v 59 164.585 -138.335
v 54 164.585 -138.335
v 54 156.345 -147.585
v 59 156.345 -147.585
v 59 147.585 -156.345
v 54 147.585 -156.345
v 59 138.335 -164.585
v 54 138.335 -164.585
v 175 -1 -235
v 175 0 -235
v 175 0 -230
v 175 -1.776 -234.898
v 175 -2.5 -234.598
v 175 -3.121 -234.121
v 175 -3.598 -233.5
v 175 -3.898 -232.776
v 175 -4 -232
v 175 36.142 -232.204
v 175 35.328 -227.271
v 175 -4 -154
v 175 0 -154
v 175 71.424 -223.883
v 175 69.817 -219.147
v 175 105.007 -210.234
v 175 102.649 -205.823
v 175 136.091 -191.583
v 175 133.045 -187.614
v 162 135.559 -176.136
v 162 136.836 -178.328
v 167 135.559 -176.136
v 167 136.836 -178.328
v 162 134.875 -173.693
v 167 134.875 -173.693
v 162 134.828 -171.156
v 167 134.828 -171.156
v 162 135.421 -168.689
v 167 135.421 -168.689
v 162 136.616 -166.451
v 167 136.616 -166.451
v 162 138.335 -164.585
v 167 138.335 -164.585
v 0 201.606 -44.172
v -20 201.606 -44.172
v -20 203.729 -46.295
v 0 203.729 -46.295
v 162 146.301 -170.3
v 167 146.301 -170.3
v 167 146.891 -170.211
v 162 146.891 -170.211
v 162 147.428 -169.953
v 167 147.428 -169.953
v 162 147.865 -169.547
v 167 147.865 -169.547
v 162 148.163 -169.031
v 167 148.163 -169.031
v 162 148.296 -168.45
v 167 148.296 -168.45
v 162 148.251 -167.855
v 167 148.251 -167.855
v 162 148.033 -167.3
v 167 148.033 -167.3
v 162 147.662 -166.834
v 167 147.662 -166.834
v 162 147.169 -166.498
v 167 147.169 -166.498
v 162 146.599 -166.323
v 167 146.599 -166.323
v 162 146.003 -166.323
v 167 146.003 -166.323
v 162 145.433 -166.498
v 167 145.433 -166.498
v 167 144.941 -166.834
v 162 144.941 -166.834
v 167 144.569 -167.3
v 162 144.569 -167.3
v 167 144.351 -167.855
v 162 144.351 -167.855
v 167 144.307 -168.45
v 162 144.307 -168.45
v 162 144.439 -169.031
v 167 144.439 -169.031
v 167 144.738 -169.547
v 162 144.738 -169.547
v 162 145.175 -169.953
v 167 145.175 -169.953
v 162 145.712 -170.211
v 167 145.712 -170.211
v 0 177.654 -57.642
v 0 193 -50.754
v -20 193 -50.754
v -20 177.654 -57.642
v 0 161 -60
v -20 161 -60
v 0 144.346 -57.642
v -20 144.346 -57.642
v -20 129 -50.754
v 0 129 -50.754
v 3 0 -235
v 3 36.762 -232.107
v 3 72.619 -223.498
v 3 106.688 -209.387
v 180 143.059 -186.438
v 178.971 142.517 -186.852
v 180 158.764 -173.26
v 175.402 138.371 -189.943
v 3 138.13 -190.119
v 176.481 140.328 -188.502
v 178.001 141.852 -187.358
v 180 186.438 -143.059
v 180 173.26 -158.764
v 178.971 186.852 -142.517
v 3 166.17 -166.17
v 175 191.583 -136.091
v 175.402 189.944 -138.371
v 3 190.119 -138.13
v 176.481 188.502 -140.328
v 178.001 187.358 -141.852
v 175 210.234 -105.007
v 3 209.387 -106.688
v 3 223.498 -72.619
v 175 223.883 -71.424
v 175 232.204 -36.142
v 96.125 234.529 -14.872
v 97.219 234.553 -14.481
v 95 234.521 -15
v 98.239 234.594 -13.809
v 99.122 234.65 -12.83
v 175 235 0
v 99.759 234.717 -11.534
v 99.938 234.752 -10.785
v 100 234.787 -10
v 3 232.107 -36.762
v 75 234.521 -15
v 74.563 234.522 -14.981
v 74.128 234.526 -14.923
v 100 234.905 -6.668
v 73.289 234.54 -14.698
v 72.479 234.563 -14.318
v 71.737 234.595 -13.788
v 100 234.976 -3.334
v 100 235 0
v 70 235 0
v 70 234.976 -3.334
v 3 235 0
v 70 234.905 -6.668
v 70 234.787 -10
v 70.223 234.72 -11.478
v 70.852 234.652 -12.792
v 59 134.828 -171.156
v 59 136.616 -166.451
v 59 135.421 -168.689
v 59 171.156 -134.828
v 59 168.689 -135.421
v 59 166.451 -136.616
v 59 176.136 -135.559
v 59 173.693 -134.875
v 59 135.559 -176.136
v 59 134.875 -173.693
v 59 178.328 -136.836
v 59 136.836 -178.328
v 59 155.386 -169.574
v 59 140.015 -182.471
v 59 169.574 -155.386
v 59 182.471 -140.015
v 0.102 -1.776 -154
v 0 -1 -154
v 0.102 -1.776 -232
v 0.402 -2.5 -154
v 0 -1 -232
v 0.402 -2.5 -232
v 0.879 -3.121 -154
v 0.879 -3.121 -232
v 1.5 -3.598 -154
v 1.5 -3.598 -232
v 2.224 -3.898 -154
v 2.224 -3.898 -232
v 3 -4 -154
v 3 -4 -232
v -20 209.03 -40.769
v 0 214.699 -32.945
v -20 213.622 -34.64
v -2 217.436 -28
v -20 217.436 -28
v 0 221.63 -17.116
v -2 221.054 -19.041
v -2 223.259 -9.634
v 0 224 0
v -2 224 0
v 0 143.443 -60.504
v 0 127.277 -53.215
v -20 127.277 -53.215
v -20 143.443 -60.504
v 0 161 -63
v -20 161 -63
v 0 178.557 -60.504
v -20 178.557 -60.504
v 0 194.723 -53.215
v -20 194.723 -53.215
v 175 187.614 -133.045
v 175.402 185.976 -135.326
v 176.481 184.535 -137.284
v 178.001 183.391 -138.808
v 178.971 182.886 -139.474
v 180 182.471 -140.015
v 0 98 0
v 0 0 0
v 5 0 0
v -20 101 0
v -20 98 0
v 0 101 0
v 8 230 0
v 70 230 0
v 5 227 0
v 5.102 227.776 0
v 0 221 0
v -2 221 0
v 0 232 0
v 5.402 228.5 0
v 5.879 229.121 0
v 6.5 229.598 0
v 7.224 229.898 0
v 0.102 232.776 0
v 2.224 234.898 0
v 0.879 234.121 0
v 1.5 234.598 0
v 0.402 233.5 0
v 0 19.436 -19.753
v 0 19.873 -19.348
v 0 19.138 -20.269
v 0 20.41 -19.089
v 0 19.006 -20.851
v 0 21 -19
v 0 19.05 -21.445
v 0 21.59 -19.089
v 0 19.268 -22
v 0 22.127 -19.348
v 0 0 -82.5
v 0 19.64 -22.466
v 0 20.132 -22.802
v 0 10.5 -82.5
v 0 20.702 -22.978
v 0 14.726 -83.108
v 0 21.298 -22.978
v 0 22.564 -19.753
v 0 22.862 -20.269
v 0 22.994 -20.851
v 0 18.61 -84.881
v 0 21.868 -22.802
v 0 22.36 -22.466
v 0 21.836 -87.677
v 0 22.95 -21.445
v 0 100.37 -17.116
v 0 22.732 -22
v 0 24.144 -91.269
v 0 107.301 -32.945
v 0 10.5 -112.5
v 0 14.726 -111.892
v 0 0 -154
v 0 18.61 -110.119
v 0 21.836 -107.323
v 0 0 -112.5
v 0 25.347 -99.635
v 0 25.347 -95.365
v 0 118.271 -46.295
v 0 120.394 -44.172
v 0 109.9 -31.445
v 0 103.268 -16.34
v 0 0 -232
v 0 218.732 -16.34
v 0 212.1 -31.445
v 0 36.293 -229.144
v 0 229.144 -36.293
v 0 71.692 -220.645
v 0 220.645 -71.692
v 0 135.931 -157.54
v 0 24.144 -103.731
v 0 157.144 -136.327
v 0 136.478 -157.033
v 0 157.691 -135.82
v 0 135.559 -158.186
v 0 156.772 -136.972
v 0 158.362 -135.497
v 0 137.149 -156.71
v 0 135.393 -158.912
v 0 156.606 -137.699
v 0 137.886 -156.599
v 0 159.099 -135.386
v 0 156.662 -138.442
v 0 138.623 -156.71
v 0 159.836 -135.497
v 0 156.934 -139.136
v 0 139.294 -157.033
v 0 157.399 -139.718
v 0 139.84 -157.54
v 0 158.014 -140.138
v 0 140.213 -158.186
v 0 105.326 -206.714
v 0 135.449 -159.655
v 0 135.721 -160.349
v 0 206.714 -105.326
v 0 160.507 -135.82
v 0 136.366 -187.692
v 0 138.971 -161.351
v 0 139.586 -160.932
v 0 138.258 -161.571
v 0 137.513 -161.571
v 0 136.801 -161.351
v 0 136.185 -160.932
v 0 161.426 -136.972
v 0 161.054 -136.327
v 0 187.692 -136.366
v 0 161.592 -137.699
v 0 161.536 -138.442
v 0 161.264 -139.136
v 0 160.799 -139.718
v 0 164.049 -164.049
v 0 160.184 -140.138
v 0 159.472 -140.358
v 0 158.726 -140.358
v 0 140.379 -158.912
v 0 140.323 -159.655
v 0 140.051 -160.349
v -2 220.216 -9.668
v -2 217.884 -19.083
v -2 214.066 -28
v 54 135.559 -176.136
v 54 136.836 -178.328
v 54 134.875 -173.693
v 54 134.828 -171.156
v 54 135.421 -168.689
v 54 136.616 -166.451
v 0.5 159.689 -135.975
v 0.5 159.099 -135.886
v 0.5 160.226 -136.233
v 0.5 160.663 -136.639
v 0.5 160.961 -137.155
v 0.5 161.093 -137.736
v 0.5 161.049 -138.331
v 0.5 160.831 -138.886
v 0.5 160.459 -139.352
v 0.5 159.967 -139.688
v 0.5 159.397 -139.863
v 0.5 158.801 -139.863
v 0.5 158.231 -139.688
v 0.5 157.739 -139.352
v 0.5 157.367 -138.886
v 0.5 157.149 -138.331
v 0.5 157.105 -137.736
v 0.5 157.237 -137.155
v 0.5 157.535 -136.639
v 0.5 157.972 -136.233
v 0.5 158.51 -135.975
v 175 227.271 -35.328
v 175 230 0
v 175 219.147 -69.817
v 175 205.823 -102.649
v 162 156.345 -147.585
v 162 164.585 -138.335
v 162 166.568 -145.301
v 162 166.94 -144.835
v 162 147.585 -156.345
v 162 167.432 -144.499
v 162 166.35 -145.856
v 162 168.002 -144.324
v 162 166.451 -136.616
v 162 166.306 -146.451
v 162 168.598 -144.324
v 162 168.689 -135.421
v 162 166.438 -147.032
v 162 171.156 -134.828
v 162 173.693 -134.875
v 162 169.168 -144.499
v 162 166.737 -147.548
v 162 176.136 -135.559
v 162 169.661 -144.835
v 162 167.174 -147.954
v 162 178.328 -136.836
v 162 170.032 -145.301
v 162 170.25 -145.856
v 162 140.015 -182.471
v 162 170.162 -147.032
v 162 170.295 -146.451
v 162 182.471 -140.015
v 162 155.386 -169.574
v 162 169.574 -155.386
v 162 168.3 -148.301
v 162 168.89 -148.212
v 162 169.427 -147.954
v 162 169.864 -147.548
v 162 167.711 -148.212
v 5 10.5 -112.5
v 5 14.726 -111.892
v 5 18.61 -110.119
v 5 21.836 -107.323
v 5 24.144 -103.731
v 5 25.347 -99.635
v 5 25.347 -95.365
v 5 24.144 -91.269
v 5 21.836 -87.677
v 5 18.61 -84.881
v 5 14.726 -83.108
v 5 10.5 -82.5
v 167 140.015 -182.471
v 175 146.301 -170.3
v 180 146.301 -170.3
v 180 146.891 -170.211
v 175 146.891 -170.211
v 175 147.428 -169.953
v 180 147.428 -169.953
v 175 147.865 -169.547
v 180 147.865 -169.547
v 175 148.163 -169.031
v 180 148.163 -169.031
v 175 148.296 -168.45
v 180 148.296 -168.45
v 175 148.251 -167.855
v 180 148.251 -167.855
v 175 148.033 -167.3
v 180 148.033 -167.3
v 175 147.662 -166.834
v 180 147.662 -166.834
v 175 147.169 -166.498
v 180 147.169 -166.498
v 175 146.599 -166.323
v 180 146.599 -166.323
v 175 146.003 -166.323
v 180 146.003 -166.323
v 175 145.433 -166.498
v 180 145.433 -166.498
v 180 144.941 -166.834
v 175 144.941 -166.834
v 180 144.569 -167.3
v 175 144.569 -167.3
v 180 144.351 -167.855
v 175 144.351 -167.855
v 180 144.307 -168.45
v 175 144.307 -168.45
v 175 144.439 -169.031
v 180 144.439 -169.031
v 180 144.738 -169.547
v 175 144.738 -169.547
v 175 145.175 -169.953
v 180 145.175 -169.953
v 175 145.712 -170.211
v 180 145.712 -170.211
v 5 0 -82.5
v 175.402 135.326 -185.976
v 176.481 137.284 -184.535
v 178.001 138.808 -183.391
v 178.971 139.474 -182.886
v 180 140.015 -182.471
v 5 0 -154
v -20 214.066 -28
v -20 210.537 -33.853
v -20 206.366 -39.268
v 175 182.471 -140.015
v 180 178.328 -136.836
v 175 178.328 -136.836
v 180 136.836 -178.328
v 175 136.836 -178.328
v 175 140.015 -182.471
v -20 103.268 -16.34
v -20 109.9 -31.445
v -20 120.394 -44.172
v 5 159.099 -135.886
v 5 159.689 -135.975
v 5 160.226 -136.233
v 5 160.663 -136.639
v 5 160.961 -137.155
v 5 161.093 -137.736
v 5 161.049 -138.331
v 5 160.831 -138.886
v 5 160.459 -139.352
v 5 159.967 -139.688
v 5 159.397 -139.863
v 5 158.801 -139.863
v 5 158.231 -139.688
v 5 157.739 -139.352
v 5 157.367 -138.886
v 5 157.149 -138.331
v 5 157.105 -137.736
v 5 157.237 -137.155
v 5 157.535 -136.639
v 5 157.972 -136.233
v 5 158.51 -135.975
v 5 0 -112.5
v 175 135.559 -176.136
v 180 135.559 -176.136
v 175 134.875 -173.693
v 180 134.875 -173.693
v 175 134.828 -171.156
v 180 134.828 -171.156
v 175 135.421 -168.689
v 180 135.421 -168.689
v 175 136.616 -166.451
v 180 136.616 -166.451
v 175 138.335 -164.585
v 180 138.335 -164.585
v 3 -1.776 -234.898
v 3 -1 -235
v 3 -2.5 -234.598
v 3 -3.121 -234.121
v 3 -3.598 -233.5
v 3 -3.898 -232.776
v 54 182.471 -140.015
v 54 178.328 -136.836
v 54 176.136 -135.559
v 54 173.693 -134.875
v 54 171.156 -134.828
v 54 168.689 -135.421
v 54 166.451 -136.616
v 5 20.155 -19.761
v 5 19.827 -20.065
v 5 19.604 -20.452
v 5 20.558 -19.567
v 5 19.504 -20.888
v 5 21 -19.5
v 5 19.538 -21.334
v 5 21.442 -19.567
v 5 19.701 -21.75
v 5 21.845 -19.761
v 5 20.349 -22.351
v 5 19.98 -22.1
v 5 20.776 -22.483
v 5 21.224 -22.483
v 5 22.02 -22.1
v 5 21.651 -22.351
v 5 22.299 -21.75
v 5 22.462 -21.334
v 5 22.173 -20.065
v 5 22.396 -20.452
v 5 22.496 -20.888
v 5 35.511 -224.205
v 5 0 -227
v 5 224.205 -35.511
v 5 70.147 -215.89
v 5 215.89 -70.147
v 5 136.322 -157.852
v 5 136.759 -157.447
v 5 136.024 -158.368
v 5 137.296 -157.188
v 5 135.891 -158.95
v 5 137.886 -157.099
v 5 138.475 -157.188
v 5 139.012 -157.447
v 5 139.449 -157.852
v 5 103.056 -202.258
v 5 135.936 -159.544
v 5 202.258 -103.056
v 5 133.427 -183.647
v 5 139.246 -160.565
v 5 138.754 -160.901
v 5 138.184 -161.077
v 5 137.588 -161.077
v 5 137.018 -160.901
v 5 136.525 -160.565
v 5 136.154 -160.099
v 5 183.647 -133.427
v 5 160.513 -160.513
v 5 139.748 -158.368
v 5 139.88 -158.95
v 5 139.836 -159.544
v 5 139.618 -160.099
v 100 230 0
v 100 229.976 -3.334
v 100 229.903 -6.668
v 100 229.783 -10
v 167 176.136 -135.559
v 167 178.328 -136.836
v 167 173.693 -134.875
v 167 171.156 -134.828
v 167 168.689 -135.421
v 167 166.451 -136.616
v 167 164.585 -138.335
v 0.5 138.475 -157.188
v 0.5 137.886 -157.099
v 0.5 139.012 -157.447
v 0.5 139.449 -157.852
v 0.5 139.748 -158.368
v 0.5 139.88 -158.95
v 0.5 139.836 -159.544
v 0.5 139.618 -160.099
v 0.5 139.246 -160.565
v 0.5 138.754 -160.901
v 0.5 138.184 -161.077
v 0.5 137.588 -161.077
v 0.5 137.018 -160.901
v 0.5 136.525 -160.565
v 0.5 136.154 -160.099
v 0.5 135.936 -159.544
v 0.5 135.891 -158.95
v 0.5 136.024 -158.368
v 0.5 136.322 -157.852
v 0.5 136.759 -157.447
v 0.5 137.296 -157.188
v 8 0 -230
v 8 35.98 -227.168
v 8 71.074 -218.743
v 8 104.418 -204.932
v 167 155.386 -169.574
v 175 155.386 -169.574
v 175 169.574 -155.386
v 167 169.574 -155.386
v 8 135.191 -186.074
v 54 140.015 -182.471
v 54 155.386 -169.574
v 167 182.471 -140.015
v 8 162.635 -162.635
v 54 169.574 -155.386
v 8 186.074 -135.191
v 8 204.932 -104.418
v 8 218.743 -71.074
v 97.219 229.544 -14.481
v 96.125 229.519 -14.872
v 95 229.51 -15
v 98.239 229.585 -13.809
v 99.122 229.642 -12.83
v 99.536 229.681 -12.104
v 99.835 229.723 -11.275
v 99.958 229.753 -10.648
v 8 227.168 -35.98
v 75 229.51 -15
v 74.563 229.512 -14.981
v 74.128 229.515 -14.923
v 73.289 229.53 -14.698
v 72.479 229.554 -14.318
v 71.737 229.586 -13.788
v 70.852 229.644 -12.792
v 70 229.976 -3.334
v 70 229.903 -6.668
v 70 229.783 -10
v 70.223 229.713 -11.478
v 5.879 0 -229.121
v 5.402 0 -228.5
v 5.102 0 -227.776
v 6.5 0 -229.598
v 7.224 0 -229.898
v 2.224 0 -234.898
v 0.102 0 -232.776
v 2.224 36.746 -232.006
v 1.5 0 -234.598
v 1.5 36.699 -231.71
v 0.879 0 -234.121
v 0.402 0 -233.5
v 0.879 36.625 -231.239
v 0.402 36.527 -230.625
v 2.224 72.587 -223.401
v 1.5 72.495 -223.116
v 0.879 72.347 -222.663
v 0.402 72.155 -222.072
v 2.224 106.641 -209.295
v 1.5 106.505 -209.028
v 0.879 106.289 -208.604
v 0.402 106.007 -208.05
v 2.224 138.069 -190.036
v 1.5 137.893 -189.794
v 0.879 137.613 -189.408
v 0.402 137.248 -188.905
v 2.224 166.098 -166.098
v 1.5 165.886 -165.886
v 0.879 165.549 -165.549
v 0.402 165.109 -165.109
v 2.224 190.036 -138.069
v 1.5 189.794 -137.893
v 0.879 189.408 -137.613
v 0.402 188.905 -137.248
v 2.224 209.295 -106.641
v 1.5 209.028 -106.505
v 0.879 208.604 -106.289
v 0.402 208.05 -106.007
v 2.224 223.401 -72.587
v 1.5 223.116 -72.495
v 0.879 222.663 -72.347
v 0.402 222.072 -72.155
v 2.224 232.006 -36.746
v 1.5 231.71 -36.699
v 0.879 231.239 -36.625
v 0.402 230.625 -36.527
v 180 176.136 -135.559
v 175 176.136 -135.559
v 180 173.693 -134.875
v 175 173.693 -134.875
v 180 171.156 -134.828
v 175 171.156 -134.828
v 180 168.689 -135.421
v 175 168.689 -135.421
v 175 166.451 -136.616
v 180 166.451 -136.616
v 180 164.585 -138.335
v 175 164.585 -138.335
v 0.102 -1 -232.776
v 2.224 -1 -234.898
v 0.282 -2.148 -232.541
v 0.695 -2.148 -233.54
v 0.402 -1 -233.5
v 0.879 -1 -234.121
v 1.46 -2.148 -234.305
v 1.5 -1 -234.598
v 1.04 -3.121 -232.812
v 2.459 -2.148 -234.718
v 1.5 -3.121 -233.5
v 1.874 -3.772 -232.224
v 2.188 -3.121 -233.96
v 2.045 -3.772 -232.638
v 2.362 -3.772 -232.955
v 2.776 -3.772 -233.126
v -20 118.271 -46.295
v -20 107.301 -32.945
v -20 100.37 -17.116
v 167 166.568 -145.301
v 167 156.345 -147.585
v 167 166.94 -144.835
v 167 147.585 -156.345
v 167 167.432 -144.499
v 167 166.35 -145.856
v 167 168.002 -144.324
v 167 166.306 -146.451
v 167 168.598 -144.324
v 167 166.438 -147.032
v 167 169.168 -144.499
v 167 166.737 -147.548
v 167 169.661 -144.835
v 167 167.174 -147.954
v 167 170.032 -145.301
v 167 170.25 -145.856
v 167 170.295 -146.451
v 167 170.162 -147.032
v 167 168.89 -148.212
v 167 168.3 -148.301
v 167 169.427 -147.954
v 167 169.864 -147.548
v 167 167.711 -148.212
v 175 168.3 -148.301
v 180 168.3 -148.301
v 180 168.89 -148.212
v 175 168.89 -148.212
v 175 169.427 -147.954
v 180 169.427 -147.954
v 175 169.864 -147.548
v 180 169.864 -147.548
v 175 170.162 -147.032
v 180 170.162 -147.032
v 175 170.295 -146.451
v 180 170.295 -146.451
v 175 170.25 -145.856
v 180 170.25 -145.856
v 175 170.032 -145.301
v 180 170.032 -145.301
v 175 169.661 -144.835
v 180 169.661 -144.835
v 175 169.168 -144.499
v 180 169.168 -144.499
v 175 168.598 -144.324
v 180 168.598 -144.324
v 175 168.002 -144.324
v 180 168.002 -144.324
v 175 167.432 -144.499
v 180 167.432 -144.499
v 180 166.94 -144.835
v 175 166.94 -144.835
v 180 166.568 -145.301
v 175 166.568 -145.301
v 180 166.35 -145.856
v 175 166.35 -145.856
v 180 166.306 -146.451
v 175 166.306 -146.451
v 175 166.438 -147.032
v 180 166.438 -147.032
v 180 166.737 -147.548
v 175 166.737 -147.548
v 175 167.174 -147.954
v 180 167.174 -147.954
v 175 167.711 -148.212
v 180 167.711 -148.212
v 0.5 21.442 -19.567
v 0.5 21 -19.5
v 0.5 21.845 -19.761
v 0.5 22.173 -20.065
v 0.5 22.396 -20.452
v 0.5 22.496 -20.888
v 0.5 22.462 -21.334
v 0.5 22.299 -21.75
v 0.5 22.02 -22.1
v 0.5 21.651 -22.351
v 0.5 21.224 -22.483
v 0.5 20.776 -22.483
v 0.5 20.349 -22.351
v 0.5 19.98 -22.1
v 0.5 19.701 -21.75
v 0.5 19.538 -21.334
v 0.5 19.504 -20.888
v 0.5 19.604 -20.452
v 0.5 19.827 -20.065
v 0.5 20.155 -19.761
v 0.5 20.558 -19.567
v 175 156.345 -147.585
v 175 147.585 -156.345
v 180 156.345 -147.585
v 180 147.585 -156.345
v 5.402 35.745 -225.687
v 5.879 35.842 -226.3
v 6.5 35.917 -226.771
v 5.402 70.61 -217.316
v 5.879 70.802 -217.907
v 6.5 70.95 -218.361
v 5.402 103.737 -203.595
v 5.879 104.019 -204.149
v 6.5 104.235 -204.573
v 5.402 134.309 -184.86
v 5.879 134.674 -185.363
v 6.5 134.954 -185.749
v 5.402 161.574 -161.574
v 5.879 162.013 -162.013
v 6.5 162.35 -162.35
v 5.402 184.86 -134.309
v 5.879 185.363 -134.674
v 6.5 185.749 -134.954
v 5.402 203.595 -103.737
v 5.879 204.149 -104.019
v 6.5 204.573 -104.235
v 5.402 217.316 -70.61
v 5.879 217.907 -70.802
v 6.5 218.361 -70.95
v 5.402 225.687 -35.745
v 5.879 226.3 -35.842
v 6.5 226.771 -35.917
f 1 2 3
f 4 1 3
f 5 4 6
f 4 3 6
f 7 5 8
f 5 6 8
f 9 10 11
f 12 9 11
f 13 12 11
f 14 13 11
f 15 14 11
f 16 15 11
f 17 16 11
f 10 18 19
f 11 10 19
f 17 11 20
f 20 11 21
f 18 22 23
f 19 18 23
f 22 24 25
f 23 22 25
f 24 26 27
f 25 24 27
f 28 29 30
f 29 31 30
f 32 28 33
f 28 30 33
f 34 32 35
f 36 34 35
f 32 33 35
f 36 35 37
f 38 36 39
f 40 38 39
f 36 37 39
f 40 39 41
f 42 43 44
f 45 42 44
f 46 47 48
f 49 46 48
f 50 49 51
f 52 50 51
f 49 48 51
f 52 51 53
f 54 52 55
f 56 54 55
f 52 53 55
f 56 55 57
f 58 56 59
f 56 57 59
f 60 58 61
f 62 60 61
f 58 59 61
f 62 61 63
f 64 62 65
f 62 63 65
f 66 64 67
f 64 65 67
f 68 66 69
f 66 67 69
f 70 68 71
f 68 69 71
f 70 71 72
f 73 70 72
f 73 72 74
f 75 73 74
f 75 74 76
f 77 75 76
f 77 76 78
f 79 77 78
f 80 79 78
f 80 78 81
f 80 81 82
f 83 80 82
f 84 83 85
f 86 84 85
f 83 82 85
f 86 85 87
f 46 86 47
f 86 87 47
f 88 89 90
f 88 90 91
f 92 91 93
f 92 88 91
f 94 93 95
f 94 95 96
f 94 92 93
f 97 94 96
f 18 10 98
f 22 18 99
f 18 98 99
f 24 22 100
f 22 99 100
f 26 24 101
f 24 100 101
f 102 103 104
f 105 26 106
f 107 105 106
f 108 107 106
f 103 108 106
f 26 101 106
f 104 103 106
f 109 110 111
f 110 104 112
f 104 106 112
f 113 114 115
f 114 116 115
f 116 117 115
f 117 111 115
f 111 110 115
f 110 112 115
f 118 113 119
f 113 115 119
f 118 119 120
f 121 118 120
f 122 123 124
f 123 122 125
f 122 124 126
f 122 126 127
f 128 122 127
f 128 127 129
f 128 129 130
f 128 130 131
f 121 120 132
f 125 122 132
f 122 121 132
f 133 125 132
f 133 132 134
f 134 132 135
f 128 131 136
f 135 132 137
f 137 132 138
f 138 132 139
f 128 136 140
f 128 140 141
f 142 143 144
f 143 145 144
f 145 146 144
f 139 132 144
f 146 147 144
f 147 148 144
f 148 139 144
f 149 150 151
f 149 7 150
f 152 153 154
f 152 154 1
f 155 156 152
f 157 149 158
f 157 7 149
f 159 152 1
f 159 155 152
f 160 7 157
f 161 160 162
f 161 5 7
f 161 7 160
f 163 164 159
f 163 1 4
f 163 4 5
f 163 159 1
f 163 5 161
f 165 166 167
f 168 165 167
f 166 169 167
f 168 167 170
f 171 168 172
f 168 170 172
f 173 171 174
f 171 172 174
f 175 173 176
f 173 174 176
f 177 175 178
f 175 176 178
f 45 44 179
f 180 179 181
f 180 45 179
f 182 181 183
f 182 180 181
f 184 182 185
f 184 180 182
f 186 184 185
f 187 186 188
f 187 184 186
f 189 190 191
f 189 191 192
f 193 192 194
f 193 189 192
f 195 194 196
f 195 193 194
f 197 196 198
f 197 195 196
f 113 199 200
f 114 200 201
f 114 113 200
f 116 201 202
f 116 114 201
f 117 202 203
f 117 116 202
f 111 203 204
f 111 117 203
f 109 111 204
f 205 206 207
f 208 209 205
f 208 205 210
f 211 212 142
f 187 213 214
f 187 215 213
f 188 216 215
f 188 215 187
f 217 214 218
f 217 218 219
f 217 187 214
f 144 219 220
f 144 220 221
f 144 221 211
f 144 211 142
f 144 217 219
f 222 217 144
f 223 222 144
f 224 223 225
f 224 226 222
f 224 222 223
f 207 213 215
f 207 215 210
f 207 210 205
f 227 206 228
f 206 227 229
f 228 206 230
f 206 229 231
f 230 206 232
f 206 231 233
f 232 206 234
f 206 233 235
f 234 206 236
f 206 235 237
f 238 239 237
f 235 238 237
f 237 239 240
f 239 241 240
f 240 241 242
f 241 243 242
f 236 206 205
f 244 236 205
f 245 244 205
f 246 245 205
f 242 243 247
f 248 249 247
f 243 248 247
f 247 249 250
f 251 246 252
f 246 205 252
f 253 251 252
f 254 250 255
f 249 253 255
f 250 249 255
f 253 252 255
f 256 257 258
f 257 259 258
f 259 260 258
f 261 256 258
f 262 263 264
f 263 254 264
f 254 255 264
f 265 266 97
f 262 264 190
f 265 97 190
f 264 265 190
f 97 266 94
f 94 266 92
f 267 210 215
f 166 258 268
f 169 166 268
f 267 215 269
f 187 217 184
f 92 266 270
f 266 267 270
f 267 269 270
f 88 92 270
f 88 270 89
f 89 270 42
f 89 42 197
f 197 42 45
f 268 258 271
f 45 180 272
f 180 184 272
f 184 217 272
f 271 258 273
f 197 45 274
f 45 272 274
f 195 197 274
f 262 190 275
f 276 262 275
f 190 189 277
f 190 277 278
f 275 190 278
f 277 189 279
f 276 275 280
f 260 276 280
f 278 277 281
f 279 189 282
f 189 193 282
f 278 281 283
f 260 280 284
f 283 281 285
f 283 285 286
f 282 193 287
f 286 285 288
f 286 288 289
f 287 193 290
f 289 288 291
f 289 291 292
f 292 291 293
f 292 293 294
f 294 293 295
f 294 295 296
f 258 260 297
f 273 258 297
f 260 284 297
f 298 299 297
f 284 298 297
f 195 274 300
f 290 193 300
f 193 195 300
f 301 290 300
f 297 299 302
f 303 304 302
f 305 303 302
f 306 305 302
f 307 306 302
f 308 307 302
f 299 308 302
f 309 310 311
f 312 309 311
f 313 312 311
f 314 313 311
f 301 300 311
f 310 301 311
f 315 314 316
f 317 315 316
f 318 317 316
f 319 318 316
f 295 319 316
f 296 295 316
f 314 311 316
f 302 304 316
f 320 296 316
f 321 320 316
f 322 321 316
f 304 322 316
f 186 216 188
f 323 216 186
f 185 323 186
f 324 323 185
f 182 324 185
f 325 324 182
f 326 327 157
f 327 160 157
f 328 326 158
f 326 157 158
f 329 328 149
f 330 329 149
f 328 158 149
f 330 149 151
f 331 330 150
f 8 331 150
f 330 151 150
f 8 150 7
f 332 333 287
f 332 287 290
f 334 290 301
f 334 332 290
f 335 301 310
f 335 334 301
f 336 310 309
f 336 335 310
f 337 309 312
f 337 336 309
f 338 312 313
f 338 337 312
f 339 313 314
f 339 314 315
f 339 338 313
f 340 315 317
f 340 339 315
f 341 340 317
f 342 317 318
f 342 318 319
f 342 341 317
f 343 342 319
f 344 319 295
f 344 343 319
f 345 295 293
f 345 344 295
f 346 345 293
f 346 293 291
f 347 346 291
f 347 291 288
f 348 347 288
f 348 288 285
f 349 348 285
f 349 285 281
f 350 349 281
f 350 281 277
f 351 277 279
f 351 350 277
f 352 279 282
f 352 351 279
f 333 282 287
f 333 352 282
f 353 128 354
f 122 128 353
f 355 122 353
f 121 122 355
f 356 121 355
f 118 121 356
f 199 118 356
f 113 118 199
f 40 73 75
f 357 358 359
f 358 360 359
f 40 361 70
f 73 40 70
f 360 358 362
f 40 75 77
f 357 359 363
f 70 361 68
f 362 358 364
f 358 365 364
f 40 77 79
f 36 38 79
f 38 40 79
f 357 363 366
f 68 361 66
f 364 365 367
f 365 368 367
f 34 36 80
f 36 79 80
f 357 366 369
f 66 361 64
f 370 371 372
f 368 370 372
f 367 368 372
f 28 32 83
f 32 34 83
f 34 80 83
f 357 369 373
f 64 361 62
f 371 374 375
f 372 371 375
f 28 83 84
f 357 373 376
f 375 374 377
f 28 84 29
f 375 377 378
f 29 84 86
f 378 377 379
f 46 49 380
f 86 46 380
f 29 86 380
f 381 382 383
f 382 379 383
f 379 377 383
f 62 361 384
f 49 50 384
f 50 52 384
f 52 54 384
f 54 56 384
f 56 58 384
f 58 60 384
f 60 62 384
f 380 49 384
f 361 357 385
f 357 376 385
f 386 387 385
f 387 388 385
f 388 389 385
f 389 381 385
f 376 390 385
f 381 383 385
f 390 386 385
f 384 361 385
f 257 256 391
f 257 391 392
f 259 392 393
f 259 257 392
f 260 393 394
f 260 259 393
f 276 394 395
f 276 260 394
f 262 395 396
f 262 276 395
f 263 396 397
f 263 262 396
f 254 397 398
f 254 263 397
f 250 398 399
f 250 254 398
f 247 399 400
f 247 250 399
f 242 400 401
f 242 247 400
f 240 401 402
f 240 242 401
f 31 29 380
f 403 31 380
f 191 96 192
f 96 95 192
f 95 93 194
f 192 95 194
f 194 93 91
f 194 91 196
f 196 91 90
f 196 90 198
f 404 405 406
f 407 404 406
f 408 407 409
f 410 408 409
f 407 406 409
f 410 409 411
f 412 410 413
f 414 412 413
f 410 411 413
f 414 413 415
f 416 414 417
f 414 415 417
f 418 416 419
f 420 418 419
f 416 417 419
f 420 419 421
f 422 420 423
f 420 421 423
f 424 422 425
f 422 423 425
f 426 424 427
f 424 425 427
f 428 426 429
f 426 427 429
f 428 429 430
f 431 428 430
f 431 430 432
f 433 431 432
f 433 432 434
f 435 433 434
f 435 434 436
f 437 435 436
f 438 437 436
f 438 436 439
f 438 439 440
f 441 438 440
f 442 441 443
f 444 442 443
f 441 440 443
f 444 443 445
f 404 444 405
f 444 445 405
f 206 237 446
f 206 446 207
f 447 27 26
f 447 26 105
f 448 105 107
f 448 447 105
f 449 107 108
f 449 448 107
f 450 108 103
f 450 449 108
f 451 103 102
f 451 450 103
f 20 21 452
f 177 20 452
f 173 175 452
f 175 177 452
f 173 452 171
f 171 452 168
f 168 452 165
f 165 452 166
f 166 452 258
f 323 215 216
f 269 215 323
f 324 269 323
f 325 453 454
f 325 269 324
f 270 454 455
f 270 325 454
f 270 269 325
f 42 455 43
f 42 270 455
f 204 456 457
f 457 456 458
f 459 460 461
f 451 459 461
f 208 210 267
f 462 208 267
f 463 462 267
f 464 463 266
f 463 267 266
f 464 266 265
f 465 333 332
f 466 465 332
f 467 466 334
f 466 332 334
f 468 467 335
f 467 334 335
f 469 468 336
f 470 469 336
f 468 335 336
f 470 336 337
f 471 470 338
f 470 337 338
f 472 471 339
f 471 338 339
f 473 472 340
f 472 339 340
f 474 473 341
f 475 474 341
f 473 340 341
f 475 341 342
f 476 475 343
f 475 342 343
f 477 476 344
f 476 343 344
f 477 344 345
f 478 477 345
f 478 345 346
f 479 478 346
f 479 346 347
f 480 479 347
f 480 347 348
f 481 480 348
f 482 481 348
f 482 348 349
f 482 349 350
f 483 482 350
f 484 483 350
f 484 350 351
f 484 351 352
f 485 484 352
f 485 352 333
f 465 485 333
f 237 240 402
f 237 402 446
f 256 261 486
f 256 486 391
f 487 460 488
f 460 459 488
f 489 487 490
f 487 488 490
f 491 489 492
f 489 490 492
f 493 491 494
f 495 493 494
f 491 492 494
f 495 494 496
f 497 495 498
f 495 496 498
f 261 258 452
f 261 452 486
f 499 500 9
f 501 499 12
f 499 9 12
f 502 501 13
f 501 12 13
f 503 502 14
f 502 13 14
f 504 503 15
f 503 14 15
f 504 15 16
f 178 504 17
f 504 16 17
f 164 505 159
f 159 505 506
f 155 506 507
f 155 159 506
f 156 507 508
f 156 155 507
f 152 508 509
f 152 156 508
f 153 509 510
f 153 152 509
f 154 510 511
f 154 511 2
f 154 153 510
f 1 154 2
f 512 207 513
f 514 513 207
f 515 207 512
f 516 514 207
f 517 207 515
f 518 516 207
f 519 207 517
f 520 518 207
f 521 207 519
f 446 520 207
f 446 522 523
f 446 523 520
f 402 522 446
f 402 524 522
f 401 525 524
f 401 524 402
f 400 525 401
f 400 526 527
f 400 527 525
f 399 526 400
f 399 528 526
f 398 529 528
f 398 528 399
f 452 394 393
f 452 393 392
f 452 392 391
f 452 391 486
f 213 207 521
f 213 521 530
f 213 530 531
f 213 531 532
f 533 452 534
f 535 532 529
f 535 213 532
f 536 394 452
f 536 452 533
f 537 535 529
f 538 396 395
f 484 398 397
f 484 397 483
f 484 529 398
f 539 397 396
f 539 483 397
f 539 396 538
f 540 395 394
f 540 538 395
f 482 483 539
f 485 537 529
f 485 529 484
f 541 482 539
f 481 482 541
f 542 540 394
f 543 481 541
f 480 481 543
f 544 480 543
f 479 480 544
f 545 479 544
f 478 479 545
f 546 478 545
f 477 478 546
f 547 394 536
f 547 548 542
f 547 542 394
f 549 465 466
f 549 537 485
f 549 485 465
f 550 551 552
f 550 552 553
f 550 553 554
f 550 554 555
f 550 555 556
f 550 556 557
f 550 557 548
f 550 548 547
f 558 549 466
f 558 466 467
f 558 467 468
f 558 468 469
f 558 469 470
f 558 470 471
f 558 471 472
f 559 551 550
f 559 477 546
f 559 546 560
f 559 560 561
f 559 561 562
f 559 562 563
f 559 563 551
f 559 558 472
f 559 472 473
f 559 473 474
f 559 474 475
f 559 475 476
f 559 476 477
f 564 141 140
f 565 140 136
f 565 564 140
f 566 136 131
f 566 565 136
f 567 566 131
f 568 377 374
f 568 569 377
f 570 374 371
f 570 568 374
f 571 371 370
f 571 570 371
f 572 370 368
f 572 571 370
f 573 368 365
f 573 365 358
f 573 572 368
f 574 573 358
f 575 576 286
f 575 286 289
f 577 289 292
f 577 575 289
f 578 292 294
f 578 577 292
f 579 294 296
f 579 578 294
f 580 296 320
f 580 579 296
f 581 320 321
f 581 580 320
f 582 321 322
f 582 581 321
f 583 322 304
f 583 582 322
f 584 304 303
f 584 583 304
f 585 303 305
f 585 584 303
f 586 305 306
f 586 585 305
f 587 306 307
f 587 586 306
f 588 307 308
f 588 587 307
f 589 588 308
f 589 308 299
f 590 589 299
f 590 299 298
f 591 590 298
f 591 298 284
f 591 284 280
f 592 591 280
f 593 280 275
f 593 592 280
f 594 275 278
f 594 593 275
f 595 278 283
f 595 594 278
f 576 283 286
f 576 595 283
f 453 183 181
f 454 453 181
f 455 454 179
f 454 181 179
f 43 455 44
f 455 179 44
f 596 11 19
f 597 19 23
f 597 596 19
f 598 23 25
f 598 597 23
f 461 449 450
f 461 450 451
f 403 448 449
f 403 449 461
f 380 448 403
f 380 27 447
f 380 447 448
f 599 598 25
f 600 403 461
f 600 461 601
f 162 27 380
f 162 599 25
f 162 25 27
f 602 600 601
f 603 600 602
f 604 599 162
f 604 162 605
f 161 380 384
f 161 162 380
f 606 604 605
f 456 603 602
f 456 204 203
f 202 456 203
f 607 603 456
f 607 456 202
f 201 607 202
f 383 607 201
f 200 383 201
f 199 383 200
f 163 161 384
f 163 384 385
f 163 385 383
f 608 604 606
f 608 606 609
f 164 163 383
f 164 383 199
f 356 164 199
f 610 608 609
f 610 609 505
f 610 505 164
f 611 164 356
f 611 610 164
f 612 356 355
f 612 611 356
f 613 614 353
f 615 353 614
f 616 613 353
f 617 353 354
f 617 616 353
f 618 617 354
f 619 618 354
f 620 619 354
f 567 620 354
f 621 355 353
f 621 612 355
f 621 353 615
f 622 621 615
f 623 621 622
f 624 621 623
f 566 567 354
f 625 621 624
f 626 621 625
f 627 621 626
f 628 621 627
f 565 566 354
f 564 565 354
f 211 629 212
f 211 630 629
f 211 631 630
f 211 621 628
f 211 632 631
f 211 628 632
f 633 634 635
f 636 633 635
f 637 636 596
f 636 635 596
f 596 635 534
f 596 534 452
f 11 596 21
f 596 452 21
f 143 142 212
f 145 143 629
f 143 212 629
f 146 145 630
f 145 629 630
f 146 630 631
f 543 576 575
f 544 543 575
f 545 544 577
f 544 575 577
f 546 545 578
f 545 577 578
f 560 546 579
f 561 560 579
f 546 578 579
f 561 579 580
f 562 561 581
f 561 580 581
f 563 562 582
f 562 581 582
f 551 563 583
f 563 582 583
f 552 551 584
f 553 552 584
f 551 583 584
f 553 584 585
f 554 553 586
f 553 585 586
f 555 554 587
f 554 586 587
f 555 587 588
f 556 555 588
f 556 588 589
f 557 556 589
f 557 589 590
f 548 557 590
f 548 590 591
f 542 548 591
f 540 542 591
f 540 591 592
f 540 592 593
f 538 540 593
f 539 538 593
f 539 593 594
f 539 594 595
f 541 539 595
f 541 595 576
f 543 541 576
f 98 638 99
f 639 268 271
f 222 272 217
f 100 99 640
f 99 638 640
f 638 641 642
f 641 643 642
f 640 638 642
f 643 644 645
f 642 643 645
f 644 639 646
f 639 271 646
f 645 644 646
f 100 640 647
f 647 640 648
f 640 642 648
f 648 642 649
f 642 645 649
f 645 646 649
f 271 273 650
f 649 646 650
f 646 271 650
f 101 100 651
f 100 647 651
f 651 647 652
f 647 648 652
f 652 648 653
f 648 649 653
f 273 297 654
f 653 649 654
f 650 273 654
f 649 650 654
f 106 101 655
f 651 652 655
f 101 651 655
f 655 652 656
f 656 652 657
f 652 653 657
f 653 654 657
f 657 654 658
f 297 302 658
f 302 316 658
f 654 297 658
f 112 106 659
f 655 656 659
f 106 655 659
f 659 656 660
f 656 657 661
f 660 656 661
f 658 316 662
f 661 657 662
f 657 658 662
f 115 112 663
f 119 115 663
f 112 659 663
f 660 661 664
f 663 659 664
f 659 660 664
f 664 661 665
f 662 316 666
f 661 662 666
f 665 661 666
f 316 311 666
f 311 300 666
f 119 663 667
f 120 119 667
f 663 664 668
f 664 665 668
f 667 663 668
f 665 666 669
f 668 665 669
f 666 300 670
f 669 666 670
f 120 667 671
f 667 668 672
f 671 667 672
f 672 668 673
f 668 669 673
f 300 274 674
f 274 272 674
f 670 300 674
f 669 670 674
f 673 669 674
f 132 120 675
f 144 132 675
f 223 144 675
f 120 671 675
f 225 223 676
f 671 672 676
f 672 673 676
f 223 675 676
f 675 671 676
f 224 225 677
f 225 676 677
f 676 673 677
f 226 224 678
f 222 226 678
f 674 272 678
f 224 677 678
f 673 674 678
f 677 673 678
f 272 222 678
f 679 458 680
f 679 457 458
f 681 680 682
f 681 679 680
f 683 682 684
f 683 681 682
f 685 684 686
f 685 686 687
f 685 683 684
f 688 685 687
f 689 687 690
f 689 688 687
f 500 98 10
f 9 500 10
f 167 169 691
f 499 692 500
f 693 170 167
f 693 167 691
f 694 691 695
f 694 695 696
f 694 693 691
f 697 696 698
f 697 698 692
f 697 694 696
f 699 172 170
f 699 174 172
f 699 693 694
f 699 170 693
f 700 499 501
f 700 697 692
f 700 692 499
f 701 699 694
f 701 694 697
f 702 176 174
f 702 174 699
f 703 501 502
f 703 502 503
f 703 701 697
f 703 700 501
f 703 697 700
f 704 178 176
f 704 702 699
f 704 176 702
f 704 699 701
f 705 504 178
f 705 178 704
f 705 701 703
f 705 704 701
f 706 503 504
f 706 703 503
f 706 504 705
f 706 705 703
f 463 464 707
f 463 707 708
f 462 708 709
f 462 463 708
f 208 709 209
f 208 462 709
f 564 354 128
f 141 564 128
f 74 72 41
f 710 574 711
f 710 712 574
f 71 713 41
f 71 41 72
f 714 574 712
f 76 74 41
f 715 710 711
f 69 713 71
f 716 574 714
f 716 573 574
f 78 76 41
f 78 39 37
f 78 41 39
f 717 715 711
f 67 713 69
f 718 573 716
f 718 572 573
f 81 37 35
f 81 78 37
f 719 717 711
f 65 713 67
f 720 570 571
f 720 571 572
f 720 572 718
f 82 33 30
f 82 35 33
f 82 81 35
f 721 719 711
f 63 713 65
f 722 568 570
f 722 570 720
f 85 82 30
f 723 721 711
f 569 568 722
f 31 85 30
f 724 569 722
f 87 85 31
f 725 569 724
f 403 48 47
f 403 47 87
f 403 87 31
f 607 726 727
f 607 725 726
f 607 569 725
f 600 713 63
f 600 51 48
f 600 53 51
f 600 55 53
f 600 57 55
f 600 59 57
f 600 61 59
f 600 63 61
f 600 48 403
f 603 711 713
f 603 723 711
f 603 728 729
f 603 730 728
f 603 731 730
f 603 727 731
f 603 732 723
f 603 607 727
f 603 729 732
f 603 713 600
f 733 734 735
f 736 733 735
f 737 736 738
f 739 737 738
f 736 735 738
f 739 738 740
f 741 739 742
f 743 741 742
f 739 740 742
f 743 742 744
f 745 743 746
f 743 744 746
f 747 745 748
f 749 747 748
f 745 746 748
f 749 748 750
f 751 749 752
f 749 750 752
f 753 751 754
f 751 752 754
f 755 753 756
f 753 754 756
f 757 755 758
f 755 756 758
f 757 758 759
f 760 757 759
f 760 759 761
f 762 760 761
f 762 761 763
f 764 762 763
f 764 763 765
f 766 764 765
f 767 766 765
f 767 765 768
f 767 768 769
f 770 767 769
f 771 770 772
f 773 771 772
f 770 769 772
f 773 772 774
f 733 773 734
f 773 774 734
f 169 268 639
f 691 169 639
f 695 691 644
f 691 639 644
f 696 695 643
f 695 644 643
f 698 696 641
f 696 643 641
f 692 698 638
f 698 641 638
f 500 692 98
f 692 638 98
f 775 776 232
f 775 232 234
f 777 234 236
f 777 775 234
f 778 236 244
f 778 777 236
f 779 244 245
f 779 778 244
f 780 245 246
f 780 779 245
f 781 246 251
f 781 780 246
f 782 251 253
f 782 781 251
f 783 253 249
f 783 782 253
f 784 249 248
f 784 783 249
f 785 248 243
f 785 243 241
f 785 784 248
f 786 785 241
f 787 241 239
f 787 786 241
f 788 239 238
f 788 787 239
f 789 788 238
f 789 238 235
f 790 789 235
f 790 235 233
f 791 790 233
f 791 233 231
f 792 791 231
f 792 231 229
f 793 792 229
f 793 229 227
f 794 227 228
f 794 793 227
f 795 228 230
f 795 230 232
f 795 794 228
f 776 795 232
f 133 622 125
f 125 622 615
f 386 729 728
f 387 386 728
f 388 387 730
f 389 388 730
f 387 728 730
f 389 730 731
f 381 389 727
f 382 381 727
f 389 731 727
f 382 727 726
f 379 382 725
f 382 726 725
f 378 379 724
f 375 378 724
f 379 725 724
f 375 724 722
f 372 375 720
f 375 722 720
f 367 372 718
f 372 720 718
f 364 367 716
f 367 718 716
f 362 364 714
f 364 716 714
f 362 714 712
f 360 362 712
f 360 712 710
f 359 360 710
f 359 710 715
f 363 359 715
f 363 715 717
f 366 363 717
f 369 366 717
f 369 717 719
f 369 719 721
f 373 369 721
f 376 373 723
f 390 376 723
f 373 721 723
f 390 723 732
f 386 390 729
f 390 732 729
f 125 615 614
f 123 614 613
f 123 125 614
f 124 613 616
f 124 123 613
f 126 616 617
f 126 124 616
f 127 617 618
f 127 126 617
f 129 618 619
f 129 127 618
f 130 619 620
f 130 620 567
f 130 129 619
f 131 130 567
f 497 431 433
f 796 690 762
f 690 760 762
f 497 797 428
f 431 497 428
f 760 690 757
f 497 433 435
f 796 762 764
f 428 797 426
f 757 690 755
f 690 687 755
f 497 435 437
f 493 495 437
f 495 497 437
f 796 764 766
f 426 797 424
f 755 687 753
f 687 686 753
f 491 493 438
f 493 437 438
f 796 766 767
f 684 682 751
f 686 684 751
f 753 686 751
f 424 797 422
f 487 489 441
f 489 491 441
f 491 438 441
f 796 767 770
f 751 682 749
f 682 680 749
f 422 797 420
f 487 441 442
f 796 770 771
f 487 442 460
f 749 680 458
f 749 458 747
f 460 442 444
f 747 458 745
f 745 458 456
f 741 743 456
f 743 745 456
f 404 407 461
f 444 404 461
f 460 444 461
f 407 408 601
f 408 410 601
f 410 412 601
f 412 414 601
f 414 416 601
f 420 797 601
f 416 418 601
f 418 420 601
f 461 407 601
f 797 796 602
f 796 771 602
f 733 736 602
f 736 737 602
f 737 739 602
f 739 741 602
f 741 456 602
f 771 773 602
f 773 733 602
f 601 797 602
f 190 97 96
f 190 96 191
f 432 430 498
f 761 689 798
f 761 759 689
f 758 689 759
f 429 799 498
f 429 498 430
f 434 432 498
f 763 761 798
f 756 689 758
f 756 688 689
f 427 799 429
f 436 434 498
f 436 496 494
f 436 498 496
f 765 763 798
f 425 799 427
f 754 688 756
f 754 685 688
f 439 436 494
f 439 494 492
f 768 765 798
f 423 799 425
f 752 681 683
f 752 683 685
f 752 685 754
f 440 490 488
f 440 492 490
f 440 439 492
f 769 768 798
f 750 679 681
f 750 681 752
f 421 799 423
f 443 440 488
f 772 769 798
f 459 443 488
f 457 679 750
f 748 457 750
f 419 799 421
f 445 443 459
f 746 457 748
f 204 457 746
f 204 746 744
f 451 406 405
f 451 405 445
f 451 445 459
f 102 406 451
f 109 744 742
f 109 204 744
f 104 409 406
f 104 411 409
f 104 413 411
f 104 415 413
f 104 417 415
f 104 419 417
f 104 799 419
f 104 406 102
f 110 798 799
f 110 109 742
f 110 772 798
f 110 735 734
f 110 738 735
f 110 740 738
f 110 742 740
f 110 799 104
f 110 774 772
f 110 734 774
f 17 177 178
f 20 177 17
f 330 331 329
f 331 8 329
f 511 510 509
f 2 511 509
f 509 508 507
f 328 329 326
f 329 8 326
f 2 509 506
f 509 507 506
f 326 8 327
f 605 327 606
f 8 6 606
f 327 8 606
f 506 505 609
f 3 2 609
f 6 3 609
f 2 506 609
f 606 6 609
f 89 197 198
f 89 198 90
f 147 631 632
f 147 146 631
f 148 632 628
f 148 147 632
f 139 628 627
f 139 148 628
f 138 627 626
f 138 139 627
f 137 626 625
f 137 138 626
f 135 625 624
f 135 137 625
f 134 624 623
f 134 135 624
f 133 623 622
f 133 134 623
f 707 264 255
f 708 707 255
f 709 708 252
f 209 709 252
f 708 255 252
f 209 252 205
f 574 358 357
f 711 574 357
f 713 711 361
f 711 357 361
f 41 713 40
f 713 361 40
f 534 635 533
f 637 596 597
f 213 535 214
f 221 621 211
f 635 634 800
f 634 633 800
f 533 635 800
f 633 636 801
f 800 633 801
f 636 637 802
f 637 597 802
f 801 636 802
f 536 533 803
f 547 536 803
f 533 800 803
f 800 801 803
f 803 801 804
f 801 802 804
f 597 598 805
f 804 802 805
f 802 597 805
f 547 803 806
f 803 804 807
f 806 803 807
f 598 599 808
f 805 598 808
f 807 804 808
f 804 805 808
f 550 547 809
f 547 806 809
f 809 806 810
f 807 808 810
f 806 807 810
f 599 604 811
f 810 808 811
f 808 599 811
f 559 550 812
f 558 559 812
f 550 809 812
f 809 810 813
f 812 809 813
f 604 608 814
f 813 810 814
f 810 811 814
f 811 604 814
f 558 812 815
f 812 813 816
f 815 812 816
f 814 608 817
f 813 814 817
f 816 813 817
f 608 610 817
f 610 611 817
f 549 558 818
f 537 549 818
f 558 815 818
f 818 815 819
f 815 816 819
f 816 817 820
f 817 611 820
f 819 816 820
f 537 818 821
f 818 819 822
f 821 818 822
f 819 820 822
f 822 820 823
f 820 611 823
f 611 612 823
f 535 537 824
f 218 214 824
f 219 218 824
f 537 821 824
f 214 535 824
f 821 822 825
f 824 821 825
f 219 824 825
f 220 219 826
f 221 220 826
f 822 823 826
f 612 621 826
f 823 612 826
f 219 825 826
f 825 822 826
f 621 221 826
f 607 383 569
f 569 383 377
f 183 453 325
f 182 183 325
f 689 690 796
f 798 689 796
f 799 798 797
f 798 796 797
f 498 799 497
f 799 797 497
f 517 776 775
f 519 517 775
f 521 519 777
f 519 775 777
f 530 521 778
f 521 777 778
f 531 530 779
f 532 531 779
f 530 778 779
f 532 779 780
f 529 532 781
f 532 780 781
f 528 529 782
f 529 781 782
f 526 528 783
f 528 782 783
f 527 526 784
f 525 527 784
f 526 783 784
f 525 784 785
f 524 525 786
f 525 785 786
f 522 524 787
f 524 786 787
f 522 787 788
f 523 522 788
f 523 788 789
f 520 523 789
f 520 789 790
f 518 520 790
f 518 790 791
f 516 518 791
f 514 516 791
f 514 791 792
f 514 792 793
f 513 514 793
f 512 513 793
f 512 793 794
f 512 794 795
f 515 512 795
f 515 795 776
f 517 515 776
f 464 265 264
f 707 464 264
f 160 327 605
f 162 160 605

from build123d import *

# Parameters (mm, degrees)
SKETCH_1_R          = 235
EXTRUDE_1_DEPTH     = 5
SKETCH_2_R          = 235
SKETCH_2_R_2        = 230
EXTRUDE_2_DEPTH     = 170
CUT_EXTRUDE_1_DEPTH = 376.599520766
EXTRUDE_START       = -5
EXTRUDE_3_DEPTH     = 5
EXTRUDE_4_DEPTH     = 5
SKETCH_6_R          = 2
CUT_EXTRUDE_2_DEPTH = 5
FILLET_1_R          = 3
EXTRUDE_5_DEPTH     = 5
FILLET_2_R          = 10
FILLET_3_R          = 10
SKETCH_8_R          = 2
CUT_EXTRUDE_3_DEPTH = 5
FILLET_4_R          = 10
EXTRUDE_6_DEPTH     = 4
FILLET_5_R          = 3
EXTRUDE_7_DEPTH     = 20
CUT_EXTRUDE_START   = 120
SKETCH_12_W         = 22.896395415
SKETCH_12_H         = 51.404652451
CUT_EXTRUDE_5_DEPTH = 120
SKETCH_13_W         = 30
SKETCH_13_H         = 30
CUT_EXTRUDE_6_DEPTH = 378.955023951
FILLET_6_R          = 5
CUT_EXTRUDE_7_DEPTH = 10
SKETCH_15_R         = 1.5
CUT_EXTRUDE_8_DEPTH = 10
CHAMFER_1_SIZE      = 0.5
SKETCH_16_R         = 2
CUT_EXTRUDE_9_DEPTH = 10
CHAMFER_2_SIZE      = 0.5


with BuildPart() as part:
    # 草图1 → 凸台-拉伸1 (new body)
    with BuildSketch(Plane(origin=(0, 0, 0), x_dir=(0, 0, -1), z_dir=(1, 0, 0))):
        Circle(SKETCH_1_R)
    extrude(amount=EXTRUDE_1_DEPTH)

    # 草图2 → 凸台-拉伸2 (add)
    with BuildSketch(Plane(origin=(5, 0, 0), x_dir=(0, 0, -1), z_dir=(1, 0, 0))):
        Circle(SKETCH_2_R)
        Circle(SKETCH_2_R_2, mode=Mode.SUBTRACT)
    extrude(amount=EXTRUDE_2_DEPTH)

    # 草图3 → 切除-拉伸1 (cut, through all)
    with BuildSketch(Plane.ZY):
        Polygon((0, 0), (0, 250), (330.887429436, 250), (330.887429436, -253.432712339), (-250, -253.432712339), (-250, 0), align=None)
    extrude(amount=-CUT_EXTRUDE_1_DEPTH, mode=Mode.SUBTRACT)

    # 草图4 → 凸台-拉伸3 (add)
    with BuildSketch(Plane(origin=(167, 0, 0), x_dir=(0, 0, -1), z_dir=(1, 0, 0)).offset(EXTRUDE_START)):
        with BuildLine():
            Line((170.570968163, 130.883707237), (182.471268267, 140.015128672))
            ThreePointArc((182.471268267, 140.015128672), (162.634559673, 162.634559673), (140.015128672, 182.471268267))
            Line((140.015128672, 182.471268267), (130.883707237, 170.570968163))
            ThreePointArc((130.883707237, 170.570968163), (152.027957955, 152.027957955), (170.570968163, 130.883707237))
        make_face()
    extrude(amount=EXTRUDE_3_DEPTH)

    # 草图5 → 凸台-拉伸4 (add)
    with BuildSketch(Plane(origin=(59, 0, 0), x_dir=(0, 0, -1), z_dir=(1, 0, 0)).offset(EXTRUDE_START)):
        with BuildLine():
            Line((170.570968163, 130.883707237), (182.471268267, 140.015128672))
            ThreePointArc((182.471268267, 140.015128672), (162.634559673, 162.634559673), (140.015128672, 182.471268267))
            Line((140.015128672, 182.471268267), (130.883707237, 170.570968163))
            ThreePointArc((130.883707237, 170.570968163), (152.027957955, 152.027957955), (170.570968163, 130.883707237))
        make_face()
    extrude(amount=EXTRUDE_4_DEPTH)

    # 草图6 → 切除-拉伸2 (cut)
    with BuildSketch(Plane(origin=(167, 0, 0), x_dir=(0, 0, -1), z_dir=(1, 0, 0))):
        with Locations((146.301163465, 168.30023639)):
            Circle(SKETCH_6_R)
        with Locations((168.30023639, 146.301163465)):
            Circle(SKETCH_6_R)
    extrude(amount=-CUT_EXTRUDE_2_DEPTH, mode=Mode.SUBTRACT)

    # 圆角1
    fillet_1_edges = [part.edges().sort_by_distance(p)[0] for p in [
        (5, 162.634559673, -162.634559673),
        (0, 166.170093579, -166.170093579),
    ]]
    fillet(fillet_1_edges, radius=FILLET_1_R)

    # 草图7 → 凸台-拉伸5 (add)
    with BuildSketch(Plane(origin=(175, 0, 0), x_dir=(0, 0, -1), z_dir=(1, 0, 0))):
        with BuildLine():
            Line((170.570968163, 130.883707237), (186.438034968, 143.058935817))
            ThreePointArc((186.438034968, 143.058935817), (166.170093579, 166.170093579), (143.058935817, 186.438034968))
            Line((143.058935817, 186.438034968), (130.883707237, 170.570968163))
            ThreePointArc((130.883707237, 170.570968163), (152.027957955, 152.027957955), (170.570968163, 130.883707237))
        make_face()
    extrude(amount=EXTRUDE_5_DEPTH)

    # 圆角2
    # the kernel refuses this fillet: 10 mm, written as the material it adds along each edge
    with BuildSketch(Plane(origin=(175, 203.61463864, -156.239007376), x_dir=(0, 0.6087614290087151, 0.7933533402912394), z_dir=(0, -0.7933533402912395, 0.6087614290087151))) as fillet_2_piece_1_section:
        with BuildLine():
            CenterArc((8.660254038, -10), FILLET_2_R, 90, 60)
            Line((0, -5), (0, 0))
            Line((0, 0), (8.660254038, 0))
        make_face()
    fillet_2_piece_1 = extrude(amount=48.301270189, mode=Mode.PRIVATE)
    fillet_2_piece_1 = fillet_2_piece_1 & Plane(origin=(176.322425454, 0, 0), x_dir=(0, 0, -1), z_dir=(-1, 0, 0)) * Cylinder(235, 132, mode=Mode.PRIVATE)
    fillet_2_piece_1 = fillet_2_piece_1 - Plane(origin=(176.322425454, 0, 0), x_dir=(0, 0, -1), z_dir=(-1, 0, 0)) * Cylinder(230, 132, mode=Mode.PRIVATE)
    add(fillet_2_piece_1)
    with BuildSketch(Plane(origin=(175, 126.835057113, -165.294664595), x_dir=(0, -0.7933533402912374, -0.6087614290087175), z_dir=(0, 0.6087614290087178, -0.7933533402912375))) as fillet_2_piece_2_section:
        with BuildLine():
            CenterArc((8.660254038, -10), FILLET_2_R, 90, 60)
            Line((0, -5), (0, 0))
            Line((0, 0), (8.660254038, 0))
        make_face()
    fillet_2_piece_2 = extrude(amount=48.301270189, mode=Mode.PRIVATE)
    fillet_2_piece_2 = fillet_2_piece_2 & Plane(origin=(176.322425454, 0, 0), x_dir=(0, 0, -1), z_dir=(-1, 0, 0)) * Cylinder(235, 132, mode=Mode.PRIVATE)
    fillet_2_piece_2 = fillet_2_piece_2 - Plane(origin=(176.322425454, 0, 0), x_dir=(0, 0, -1), z_dir=(-1, 0, 0)) * Cylinder(230, 132, mode=Mode.PRIVATE)
    add(fillet_2_piece_2)

    # 圆角3
    fillet_3_edges = [part.edges().sort_by_distance(p)[0] for p in [
        (164.5, 130.883707237, -170.570968163),
        (164.5, 170.570968163, -130.883707237),
        (177.5, 170.570968163, -130.883707237),
        (177.5, 130.883707237, -170.570968163),
    ]]
    fillet(fillet_3_edges, radius=FILLET_3_R)

    # 草图8 → 切除-拉伸3 (cut)
    with BuildSketch(Plane(origin=(180, 0, 0), x_dir=(0, 0, -1), z_dir=(1, 0, 0))):
        with Locations((168.30023639, 146.301163465)):
            Circle(SKETCH_8_R)
        with Locations((146.301163465, 168.30023639)):
            Circle(SKETCH_8_R)
    extrude(amount=-CUT_EXTRUDE_3_DEPTH, mode=Mode.SUBTRACT)

    # 圆角4
    fillet_4_edges = [part.edges().sort_by_distance(p)[0] for p in [
        (56.5, 130.883707237, -170.570968163),
        (56.5, 170.570968163, -130.883707237),
    ]]
    fillet(fillet_4_edges, radius=FILLET_4_R)

    # 草图10 → 凸台-拉伸6 (add)
    with BuildSketch(Plane.XZ):
        with BuildLine():
            Line((0, -154), (0, -232))
            ThreePointArc((0, -232), (0.878679656, -234.121320344), (3, -235))
            Line((3, -235), (175, -235))
            Line((175, -235), (175, -154))
            Line((175, -154), (0, -154))
        make_face()
    extrude(amount=EXTRUDE_6_DEPTH)

    # 圆角5
    fillet_5_edges = [part.edges().sort_by_distance(p)[0] for p in [
        (0.878679656, -4, -234.121320344),
        (89, -4, -235),
        (0, -4, -193),
    ]]
    fillet(fillet_5_edges, radius=FILLET_5_R)

    # 草图11 → 凸台-拉伸7 (add)
    with BuildSketch(Plane.ZY):
        with BuildLine():
            Line((0, 224), (0, 221))
            ThreePointArc((0, 221), (-24.121230247, 215.937839886), (-44.172276172, 201.605541713))
            Line((-44.172276172, 201.605541713), (-46.2953836, 203.72864914))
            ThreePointArc((-46.2953836, 203.72864914), (-25.269498453, 218.710072326), (0, 224))
        make_face()
        with BuildLine():
            Line((0, 98), (0, 101))
            ThreePointArc((0, 101), (-24.121230247, 106.062160114), (-44.172276172, 120.394458287))
            Line((-44.172276172, 120.394458287), (-46.2953836, 118.27135086))
            ThreePointArc((-46.2953836, 118.27135086), (-25.269498453, 103.289927674), (0, 98))
        make_face()
        with BuildLine():
            Line((-50.754310162, 129), (-53.214501999, 127.27735513))
            ThreePointArc((-53.214501999, 127.27735513), (-63, 161), (-53.214501999, 194.72264487))
            Line((-53.214501999, 194.72264487), (-50.754310162, 193))
            ThreePointArc((-50.754310162, 193), (-60, 161), (-50.754310162, 129))
        make_face()
    extrude(amount=EXTRUDE_7_DEPTH)

    # 草图12 → 切除-拉伸5 (cut)
    with BuildSketch(Plane(origin=(0, 0, 0), x_dir=(1, 0, 0), z_dir=(0, 1, 0)).offset(CUT_EXTRUDE_START)):
        with Locations((-13.448197708, 2.297673774)):
            Rectangle(SKETCH_12_W, SKETCH_12_H)
    extrude(amount=CUT_EXTRUDE_5_DEPTH, mode=Mode.SUBTRACT)

    # 草图13 → 切除-拉伸6 (cut, through all)
    with BuildSketch(Plane(origin=(0, 0, 0), x_dir=(1, 0, 0), z_dir=(0, 1, 0))):
        with Locations((85, 0)):
            Rectangle(SKETCH_13_W, SKETCH_13_H)
    extrude(amount=CUT_EXTRUDE_6_DEPTH, mode=Mode.SUBTRACT)

    # 圆角6
    fillet_6_edges = [part.edges().sort_by_distance(p)[0] for p in [
        (70, 232.015568171, -15),
        (100, 232.015568171, -15),
    ]]
    fillet(fillet_6_edges, radius=FILLET_6_R)

    # 草图14 → 切除-拉伸7 (cut)
    with BuildSketch(Plane.ZY):
        with BuildLine():
            Line((-82.5, 10.5), (-82.5, 0))
            Line((-82.5, 0), (-112.5, 0))
            Line((-112.5, 0), (-112.5, 10.5))
            ThreePointArc((-112.5, 10.5), (-97.5, 25.5), (-82.5, 10.5))
        make_face()
    extrude(amount=-CUT_EXTRUDE_7_DEPTH, mode=Mode.SUBTRACT)

    # 草图15 → 切除-拉伸8 (cut)
    with BuildSketch(Plane.ZY):
        with Locations((-21, 21)):
            Circle(SKETCH_15_R)
    extrude(amount=-CUT_EXTRUDE_8_DEPTH, mode=Mode.SUBTRACT)

    # 倒角1
    chamfer_1_edges = [part.edges().sort_by_distance(p)[0] for p in [
        (0, 21, -22.5),
    ]]
    chamfer(chamfer_1_edges, length=CHAMFER_1_SIZE)

    # 草图16 → 切除-拉伸9 (cut)
    with BuildSketch(Plane.ZY):
        with Locations((-159.099025767, 137.885822331)):
            Circle(SKETCH_16_R)
        with Locations((-137.885822331, 159.099025767)):
            Circle(SKETCH_16_R)
    extrude(amount=-CUT_EXTRUDE_9_DEPTH, mode=Mode.SUBTRACT)

    # 倒角2
    chamfer_2_edges = [part.edges().sort_by_distance(p)[0] for p in [
        (0, 137.885822331, -161.099025767),
        (0, 159.099025767, -139.885822331),
    ]]
    chamfer(chamfer_2_edges, length=CHAMFER_2_SIZE)


solid = part.part
